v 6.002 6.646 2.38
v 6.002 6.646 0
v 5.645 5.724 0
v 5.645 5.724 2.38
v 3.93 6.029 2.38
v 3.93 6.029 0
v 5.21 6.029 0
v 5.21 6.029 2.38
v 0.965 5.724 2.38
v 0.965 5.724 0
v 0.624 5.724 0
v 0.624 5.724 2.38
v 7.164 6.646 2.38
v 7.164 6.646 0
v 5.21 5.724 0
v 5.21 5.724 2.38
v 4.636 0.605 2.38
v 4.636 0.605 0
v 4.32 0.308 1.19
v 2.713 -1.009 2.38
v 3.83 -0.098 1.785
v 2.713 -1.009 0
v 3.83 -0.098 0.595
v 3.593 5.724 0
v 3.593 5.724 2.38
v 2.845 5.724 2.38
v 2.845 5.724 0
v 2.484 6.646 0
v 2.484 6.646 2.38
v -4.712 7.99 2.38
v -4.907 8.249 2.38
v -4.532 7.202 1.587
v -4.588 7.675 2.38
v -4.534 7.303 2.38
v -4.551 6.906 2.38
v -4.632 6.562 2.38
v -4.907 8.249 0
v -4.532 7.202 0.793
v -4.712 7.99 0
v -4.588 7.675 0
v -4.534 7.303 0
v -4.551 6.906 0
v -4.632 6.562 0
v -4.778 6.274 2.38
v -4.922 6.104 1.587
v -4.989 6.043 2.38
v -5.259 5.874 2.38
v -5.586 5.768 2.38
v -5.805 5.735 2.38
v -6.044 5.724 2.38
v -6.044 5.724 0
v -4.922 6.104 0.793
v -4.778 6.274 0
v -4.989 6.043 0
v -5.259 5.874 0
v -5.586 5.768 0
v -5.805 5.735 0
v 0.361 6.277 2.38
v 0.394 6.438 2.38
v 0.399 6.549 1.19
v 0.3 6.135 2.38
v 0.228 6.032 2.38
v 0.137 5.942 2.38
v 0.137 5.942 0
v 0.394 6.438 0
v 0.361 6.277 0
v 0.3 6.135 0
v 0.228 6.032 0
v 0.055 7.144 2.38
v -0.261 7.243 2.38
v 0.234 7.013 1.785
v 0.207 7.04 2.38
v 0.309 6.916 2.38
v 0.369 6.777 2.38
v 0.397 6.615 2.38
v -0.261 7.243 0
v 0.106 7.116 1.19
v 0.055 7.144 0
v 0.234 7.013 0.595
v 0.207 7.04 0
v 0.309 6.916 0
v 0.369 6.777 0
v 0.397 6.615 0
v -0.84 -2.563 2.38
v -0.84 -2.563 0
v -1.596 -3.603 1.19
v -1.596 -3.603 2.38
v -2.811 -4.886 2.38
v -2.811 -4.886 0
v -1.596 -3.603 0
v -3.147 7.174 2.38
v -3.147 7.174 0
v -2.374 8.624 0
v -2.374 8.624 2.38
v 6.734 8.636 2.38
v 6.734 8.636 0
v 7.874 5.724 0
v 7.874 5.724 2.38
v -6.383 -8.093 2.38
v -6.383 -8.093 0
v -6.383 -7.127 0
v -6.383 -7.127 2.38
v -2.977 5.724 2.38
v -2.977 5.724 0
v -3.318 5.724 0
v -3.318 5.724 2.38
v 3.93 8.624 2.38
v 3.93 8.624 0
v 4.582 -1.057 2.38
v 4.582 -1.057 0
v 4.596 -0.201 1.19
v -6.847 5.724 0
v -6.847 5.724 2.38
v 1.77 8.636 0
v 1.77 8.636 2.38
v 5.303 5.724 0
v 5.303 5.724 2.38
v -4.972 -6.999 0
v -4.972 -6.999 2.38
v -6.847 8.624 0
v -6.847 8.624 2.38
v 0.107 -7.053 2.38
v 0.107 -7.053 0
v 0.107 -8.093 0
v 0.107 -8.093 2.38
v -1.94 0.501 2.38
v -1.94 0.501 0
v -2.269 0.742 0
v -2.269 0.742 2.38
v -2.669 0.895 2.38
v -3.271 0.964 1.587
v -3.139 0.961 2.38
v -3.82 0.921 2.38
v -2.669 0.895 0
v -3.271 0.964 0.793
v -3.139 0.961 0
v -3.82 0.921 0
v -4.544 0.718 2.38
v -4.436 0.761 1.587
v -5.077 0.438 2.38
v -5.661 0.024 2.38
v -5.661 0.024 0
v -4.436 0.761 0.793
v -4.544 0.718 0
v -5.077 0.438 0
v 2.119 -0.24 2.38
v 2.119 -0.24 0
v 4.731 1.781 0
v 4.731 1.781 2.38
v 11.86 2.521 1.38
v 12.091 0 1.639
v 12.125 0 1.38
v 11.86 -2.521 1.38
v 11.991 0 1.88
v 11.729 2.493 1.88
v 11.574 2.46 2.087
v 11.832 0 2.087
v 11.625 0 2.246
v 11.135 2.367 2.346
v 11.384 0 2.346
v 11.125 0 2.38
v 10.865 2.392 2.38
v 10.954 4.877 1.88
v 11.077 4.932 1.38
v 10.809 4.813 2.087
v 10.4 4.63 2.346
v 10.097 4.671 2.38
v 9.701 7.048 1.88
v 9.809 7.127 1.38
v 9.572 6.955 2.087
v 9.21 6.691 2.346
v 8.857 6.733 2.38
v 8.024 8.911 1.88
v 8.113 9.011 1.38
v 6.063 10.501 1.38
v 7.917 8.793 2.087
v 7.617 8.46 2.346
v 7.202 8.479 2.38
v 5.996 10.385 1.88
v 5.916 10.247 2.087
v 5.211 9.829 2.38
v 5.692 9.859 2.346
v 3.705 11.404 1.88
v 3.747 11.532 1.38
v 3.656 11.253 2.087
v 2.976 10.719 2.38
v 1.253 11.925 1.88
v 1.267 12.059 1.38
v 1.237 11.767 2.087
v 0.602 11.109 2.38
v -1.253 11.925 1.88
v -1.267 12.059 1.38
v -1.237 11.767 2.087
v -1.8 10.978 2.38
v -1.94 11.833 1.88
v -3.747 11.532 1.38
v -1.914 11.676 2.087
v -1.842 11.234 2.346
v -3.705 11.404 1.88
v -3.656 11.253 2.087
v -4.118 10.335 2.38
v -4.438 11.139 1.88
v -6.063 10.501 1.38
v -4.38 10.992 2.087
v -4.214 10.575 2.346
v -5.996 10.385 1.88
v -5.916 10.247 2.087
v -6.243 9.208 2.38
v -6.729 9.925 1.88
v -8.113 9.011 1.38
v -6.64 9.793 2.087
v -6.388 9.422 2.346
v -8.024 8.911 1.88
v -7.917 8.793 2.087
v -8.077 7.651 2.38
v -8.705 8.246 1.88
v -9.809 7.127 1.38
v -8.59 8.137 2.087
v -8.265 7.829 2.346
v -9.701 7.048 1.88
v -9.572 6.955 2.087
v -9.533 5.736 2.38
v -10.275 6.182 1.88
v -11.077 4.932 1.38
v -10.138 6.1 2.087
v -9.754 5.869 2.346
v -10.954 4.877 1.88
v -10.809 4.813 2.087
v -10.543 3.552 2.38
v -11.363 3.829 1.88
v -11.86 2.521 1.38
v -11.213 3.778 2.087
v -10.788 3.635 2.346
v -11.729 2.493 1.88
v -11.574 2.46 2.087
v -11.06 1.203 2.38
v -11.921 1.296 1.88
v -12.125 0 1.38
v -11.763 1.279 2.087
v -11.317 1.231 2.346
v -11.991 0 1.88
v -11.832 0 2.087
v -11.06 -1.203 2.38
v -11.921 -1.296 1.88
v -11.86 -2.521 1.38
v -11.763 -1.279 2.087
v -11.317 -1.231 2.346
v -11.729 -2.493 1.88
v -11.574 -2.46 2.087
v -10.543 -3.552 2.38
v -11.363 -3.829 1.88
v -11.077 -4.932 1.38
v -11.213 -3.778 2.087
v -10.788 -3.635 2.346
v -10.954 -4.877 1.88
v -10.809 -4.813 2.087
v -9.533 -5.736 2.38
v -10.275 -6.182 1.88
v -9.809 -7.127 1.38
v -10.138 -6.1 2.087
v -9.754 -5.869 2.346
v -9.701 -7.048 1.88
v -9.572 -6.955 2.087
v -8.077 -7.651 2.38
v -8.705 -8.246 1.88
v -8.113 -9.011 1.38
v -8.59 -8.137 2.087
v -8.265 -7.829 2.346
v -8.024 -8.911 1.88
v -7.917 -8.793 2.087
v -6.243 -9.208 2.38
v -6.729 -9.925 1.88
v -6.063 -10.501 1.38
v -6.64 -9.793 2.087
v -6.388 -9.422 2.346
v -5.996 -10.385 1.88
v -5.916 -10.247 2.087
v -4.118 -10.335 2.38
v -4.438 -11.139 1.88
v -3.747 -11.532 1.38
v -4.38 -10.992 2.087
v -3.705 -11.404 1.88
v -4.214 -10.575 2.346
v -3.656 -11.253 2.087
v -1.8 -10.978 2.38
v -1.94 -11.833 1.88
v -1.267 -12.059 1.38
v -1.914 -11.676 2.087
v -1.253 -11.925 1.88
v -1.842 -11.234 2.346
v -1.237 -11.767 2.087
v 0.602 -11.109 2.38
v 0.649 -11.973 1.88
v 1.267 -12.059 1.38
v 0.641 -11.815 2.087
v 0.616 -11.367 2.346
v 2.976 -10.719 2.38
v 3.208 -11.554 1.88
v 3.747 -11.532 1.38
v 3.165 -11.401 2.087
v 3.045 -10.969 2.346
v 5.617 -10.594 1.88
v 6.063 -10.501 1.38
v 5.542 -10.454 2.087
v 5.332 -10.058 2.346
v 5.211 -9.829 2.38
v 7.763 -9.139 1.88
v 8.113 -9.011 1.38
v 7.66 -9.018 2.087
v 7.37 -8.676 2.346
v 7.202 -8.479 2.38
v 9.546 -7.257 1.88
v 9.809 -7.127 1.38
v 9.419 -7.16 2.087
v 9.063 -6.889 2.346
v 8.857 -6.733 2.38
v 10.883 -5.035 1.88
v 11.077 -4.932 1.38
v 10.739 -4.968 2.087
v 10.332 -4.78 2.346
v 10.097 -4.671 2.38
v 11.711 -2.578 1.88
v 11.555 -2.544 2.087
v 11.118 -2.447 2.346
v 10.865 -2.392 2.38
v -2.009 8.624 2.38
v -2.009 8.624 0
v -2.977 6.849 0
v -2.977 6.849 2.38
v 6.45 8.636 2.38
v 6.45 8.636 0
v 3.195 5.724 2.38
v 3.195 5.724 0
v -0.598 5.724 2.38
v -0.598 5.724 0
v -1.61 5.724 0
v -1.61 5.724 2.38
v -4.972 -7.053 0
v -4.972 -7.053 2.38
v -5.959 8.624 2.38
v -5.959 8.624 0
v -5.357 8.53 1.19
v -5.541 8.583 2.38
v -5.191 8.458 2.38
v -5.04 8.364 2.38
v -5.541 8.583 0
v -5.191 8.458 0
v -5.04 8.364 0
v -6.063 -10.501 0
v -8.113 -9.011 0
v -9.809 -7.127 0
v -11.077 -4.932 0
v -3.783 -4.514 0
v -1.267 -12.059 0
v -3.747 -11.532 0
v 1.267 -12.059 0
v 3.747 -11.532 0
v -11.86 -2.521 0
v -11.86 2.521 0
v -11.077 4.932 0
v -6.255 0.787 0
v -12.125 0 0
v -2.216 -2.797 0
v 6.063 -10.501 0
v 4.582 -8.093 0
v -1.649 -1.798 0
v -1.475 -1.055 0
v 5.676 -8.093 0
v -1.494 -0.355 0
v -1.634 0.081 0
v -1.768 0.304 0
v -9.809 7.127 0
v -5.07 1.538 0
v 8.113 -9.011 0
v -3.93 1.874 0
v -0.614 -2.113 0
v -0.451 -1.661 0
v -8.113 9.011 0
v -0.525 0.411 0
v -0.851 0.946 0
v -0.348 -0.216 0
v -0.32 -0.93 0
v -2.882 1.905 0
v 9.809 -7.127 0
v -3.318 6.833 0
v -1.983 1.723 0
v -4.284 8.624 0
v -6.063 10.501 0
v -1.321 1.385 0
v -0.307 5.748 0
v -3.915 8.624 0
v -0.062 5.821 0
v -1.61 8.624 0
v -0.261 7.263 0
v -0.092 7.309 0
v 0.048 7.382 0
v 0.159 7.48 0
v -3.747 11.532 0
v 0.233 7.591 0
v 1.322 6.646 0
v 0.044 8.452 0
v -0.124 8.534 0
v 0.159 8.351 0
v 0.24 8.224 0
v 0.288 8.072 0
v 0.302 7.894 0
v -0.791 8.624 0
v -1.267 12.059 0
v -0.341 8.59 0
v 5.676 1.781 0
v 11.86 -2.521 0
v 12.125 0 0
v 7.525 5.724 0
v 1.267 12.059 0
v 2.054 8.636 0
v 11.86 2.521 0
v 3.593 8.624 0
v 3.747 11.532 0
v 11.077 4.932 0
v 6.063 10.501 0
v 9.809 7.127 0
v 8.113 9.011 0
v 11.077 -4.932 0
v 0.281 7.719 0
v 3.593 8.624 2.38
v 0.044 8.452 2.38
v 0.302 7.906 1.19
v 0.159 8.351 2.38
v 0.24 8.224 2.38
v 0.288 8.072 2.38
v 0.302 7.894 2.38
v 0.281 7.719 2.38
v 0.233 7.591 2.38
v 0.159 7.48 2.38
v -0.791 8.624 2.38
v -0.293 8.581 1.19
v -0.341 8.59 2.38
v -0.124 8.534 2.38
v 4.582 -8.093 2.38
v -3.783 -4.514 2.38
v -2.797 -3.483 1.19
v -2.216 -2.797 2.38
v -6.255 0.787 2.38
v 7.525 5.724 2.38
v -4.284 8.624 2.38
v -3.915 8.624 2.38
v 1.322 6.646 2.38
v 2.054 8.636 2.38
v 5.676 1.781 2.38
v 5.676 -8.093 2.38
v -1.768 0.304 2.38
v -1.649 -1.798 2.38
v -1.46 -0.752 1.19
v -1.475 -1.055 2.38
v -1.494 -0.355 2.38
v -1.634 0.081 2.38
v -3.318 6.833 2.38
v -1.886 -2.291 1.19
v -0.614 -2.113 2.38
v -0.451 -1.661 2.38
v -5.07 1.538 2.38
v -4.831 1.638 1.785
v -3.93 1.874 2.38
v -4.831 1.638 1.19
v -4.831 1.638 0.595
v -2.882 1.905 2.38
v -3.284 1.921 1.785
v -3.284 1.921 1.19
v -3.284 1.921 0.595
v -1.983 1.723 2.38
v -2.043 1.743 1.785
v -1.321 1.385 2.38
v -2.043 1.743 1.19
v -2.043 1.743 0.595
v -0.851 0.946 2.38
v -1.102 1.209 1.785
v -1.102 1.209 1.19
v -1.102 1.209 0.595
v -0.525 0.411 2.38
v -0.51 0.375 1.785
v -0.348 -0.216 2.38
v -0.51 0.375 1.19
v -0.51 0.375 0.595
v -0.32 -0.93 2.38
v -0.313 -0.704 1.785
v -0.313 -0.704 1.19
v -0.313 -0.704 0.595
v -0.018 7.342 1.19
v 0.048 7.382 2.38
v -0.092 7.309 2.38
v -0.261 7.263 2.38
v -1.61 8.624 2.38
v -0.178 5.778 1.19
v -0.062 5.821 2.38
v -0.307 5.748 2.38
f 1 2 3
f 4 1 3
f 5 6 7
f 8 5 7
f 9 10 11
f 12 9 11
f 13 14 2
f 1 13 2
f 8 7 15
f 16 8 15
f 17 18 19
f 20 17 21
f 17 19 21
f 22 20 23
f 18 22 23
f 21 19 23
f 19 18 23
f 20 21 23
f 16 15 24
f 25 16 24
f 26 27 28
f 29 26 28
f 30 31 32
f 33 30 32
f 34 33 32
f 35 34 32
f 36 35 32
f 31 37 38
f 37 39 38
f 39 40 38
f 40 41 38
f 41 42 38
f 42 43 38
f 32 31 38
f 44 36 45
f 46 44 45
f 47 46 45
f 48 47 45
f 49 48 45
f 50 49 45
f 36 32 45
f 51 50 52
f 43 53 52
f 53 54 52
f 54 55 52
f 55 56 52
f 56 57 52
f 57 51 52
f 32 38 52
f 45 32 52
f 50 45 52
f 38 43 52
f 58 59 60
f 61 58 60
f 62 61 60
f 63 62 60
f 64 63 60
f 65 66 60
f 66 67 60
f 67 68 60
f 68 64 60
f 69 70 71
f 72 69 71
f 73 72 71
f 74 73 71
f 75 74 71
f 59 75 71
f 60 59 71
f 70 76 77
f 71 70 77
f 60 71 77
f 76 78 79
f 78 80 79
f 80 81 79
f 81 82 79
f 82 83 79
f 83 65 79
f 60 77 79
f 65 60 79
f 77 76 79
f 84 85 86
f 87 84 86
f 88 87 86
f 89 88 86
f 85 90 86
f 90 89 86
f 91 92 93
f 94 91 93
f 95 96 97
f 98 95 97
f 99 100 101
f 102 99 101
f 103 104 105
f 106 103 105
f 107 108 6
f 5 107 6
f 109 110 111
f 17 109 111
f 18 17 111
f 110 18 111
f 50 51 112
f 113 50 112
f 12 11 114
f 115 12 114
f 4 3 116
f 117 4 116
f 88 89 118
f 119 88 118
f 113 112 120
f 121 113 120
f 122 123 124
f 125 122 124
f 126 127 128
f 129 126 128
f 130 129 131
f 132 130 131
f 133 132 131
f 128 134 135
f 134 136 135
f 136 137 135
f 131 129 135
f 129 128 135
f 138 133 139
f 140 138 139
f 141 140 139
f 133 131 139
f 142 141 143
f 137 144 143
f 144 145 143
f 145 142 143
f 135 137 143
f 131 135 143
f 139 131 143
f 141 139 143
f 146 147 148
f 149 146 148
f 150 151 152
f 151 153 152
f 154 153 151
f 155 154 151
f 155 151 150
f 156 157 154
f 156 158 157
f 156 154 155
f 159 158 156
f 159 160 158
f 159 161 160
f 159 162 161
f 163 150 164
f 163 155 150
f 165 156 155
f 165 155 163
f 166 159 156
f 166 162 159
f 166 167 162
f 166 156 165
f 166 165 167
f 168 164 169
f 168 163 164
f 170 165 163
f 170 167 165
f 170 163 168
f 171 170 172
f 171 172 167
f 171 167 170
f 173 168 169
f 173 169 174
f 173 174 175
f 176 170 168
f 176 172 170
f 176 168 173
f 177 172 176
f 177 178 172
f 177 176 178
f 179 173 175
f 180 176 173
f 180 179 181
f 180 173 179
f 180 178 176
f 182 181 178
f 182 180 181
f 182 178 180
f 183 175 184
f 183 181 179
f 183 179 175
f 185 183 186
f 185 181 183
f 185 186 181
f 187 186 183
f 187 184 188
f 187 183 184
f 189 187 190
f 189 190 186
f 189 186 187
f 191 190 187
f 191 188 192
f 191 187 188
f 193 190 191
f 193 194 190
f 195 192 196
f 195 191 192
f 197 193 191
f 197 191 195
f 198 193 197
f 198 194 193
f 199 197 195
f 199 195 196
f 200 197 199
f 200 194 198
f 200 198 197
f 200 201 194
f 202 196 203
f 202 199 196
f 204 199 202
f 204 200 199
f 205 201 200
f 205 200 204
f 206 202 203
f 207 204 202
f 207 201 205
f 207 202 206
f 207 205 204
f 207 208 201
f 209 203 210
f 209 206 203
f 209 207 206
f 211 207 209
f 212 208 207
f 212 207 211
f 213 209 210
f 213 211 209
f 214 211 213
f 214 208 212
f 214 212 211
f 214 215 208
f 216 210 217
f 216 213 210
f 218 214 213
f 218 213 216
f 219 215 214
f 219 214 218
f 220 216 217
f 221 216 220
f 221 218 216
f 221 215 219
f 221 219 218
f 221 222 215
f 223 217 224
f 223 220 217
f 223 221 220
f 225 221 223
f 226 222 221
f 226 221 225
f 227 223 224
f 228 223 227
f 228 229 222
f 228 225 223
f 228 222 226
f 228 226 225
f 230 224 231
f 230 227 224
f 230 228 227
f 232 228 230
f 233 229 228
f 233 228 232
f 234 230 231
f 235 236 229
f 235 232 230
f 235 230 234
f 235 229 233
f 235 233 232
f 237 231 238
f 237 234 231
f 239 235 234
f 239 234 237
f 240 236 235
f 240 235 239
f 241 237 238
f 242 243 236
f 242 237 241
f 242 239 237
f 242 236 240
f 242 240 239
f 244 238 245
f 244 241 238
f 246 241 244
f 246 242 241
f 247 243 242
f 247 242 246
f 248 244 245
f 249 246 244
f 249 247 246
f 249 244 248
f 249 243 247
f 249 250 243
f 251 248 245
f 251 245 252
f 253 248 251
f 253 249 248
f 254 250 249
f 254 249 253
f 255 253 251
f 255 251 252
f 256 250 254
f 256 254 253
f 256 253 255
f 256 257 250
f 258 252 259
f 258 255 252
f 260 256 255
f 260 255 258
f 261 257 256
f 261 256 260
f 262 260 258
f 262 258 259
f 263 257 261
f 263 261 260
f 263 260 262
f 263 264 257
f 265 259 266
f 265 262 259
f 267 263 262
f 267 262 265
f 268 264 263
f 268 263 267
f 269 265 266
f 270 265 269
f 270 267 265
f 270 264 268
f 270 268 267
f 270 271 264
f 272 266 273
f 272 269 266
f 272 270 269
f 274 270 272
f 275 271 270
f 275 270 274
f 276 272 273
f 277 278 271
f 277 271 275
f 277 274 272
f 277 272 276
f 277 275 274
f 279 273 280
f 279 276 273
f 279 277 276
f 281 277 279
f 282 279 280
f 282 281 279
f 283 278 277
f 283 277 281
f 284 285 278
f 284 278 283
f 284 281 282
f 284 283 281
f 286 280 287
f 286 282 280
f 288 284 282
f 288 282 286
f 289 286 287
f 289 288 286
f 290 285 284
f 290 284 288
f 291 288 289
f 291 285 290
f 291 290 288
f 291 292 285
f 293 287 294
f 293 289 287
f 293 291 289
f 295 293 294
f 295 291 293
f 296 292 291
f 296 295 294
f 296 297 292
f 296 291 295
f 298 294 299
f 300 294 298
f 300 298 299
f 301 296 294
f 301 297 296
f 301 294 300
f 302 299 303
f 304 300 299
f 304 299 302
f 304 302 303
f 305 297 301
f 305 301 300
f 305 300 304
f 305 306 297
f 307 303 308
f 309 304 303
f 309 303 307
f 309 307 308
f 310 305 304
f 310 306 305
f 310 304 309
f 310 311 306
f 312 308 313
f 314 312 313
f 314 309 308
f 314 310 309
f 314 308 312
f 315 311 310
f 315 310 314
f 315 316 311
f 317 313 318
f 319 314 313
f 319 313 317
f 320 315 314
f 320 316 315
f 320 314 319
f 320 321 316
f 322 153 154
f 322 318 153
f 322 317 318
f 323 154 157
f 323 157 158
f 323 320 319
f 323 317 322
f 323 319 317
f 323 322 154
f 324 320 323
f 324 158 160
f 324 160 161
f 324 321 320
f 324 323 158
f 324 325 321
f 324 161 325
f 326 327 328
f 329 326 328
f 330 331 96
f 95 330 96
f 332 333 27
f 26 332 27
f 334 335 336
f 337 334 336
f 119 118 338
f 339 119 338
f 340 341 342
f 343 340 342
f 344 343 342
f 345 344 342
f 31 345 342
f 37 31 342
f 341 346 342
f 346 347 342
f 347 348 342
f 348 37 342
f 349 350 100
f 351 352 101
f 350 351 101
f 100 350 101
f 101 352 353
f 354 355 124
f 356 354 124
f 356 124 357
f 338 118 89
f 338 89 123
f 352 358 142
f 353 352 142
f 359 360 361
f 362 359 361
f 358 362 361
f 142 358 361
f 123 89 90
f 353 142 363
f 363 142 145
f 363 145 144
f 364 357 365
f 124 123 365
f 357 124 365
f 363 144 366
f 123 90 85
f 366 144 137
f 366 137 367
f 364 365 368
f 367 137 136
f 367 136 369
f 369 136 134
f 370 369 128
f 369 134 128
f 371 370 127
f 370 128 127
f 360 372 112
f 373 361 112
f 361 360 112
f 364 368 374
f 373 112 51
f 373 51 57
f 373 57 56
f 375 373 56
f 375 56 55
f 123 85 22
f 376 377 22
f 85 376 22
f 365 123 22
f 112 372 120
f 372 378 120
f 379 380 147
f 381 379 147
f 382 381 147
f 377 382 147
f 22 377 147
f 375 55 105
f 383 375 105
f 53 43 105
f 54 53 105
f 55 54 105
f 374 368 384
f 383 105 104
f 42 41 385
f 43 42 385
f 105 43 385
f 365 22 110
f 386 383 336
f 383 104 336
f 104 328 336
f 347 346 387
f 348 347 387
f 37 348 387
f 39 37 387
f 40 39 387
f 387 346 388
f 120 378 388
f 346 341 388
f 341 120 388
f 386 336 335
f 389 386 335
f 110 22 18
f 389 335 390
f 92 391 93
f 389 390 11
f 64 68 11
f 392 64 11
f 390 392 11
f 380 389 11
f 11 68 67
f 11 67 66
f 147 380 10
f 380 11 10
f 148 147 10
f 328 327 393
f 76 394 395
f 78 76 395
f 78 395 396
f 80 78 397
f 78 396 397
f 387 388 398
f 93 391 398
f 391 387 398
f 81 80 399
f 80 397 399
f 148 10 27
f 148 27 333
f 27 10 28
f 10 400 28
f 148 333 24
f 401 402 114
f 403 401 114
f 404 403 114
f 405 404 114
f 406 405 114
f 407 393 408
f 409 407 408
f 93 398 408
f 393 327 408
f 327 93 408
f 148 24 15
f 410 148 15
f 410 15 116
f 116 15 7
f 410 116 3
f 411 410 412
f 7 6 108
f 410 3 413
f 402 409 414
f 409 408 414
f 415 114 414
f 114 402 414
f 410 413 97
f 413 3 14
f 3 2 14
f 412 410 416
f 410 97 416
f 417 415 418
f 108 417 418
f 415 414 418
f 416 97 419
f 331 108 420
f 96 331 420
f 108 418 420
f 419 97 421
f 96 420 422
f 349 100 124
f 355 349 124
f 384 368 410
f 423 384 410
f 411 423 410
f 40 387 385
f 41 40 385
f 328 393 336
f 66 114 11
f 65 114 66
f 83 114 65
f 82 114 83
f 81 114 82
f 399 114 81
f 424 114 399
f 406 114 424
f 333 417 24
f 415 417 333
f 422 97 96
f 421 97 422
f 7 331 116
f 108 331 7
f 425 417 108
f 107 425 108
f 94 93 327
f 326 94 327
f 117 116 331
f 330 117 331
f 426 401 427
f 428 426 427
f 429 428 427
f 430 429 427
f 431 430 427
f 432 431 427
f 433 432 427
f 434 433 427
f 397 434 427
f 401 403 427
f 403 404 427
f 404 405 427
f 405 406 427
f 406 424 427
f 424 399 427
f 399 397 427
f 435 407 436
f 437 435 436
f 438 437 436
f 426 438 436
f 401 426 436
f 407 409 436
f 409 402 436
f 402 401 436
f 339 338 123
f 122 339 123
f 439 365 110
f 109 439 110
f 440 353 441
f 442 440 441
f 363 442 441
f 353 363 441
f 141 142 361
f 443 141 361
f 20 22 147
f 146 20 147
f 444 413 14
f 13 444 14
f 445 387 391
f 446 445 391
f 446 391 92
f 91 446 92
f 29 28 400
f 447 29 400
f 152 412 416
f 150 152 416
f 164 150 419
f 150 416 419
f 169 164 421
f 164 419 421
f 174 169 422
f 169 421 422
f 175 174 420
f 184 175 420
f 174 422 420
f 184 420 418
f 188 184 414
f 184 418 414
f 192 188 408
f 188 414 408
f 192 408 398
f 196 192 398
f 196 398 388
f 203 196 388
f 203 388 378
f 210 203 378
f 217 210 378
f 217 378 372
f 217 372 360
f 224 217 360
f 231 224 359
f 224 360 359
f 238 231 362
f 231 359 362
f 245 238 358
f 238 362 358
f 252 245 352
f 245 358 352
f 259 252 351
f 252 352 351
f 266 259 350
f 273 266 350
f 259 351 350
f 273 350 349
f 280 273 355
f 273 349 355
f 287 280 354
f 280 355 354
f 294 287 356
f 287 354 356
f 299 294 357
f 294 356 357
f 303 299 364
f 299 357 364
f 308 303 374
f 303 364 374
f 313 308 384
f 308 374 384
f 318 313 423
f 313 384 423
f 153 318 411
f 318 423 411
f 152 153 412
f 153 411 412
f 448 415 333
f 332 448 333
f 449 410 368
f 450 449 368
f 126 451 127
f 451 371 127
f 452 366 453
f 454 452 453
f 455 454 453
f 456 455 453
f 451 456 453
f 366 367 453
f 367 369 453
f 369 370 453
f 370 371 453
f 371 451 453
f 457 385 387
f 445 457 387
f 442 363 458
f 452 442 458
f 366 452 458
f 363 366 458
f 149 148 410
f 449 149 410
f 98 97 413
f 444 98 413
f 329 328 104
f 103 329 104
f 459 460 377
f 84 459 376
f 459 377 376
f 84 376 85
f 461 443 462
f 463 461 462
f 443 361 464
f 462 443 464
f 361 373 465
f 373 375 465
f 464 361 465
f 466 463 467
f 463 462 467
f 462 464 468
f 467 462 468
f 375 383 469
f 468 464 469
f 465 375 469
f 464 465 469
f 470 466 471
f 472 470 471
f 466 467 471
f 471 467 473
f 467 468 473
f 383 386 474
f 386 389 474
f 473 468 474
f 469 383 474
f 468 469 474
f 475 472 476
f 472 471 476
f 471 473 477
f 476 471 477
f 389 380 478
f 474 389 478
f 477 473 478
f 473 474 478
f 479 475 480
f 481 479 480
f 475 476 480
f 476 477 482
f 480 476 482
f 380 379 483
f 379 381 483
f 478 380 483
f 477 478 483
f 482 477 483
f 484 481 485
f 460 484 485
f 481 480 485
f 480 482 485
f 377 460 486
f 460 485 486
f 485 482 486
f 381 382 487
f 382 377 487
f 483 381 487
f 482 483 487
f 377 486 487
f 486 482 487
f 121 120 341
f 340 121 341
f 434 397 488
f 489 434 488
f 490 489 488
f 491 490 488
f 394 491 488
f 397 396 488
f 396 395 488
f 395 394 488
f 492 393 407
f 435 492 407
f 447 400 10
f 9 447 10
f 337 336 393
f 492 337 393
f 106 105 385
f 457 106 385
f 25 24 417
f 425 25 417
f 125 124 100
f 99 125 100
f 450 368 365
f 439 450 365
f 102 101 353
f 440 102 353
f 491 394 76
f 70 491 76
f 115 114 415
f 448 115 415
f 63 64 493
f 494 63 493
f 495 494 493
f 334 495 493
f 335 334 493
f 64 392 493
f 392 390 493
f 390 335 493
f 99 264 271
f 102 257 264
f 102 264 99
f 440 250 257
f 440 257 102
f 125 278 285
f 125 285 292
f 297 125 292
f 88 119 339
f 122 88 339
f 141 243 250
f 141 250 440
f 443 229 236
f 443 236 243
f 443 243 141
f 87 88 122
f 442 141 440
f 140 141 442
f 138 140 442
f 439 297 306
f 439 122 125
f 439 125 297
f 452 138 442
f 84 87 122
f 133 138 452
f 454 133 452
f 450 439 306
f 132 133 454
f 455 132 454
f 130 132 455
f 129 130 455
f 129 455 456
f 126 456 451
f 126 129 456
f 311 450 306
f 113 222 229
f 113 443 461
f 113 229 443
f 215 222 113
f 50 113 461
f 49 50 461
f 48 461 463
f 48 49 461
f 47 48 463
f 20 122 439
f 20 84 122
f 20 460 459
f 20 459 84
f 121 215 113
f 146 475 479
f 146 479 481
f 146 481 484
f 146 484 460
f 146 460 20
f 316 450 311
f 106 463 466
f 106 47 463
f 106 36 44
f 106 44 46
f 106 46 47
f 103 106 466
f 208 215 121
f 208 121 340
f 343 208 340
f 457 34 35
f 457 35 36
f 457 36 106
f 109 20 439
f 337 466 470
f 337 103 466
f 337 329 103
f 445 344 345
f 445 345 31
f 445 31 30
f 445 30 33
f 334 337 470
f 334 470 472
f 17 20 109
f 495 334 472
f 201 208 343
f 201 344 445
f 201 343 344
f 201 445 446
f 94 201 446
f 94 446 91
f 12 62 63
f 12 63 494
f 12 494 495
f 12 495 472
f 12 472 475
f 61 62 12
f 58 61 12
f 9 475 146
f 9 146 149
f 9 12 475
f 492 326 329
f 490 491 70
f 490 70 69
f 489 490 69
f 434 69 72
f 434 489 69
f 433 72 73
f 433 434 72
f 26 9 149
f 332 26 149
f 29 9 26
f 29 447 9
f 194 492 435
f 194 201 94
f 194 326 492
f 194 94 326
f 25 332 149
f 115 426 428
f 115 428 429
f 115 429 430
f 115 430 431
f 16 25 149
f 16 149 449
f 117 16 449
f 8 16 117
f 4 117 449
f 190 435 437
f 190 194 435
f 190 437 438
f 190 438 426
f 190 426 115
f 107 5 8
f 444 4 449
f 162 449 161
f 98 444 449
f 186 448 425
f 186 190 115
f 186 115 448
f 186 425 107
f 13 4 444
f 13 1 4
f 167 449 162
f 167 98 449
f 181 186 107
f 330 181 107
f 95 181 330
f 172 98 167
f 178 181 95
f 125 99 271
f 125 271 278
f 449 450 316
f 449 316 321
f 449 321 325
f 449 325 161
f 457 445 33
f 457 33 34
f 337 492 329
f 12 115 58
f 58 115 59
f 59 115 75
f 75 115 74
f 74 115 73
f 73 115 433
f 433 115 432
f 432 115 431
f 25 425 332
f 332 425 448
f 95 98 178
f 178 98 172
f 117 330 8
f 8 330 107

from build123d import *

# Parameters (mm, degrees)
F0_R     = 12.125
F1_DEPTH = 2.38
F2_R     = 1


with BuildPart() as f1:
    # F0 (on Top) → F1 (new body)
    with BuildSketch(Plane.XY):
        Circle(F0_R)
        with BuildLine():
            Line((0.1066171413, -7.0534729545), (0.1066171413, -8.0929240212))
            Line((0.1066171413, -8.0929240212), (-6.3829287074, -8.0929240212))
            Line((-6.3829287074, -8.0929240212), (-6.3829287074, -7.1269476661))
            Line((-6.3829287074, -7.1269476661), (-3.7832205302, -4.5142733634))
            add(Edge.make_bspline(
                [(-3.7832205302, -4.5142733634), (-2.5946590195, -3.3105847061), (-2.216480357, -2.7973422356)],
                knots=[0, 0, 0, 1, 1, 1], degree=2))
            add(Edge.make_bspline(
                [(-2.216480357, -2.7973422356), (-1.8383016945, -2.284099765), (-1.6492123632, -1.7978700561)],
                knots=[0, 0, 0, 1, 1, 1], degree=2))
            add(Edge.make_bspline(
                [(-1.6492123632, -1.7978700561), (-1.460123032, -1.3116403472), (-1.460123032, -0.7519359267)],
                knots=[0, 0, 0, 1, 1, 1], degree=2))
            add(Edge.make_bspline(
                [(-1.460123032, -0.7519359267), (-1.460123032, 0.0389977332), (-1.9398696781, 0.501456212)],
                knots=[0, 0, 0, 1, 1, 1], degree=2))
            add(Edge.make_bspline(
                [(-1.9398696781, 0.501456212), (-2.4196163243, 0.9639146907), (-3.2710585702, 0.9639146907)],
                knots=[0, 0, 0, 1, 1, 1], degree=2))
            add(Edge.make_bspline(
                [(-3.2710585702, 0.9639146907), (-3.8847885139, 0.9639146907), (-4.4358488507, 0.7607787234)],
                knots=[0, 0, 0, 1, 1, 1], degree=2))
            add(Edge.make_bspline(
                [(-4.4358488507, 0.7607787234), (-4.9869091875, 0.5576427561), (-5.6611477172, 0.0238705867)],
                knots=[0, 0, 0, 1, 1, 1], degree=2))
            Line((-5.6611477172, 0.0238705867), (-6.2554284726, 0.7867109745))
            add(Edge.make_bspline(
                [(-6.2554284726, 0.7867109745), (-4.8918242666, 1.9212469621), (-3.2840246957, 1.9212469621)],
                knots=[0, 0, 0, 1, 1, 1], degree=2))
            add(Edge.make_bspline(
                [(-3.2840246957, 1.9212469621), (-1.8923272177, 1.9212469621), (-1.1024740683, 1.2091905661)],
                knots=[0, 0, 0, 1, 1, 1], degree=2))
            add(Edge.make_bspline(
                [(-1.1024740683, 1.2091905661), (-0.3126209189, 0.4971341701), (-0.3126209189, -0.7043934662)],
                knots=[0, 0, 0, 1, 1, 1], degree=2))
            add(Edge.make_bspline(
                [(-0.3126209189, -0.7043934662), (-0.3126209189, -1.6444375702), (-0.8399100255, -2.5628714648)],
                knots=[0, 0, 0, 1, 1, 1], degree=2))
            add(Edge.make_bspline(
                [(-0.8399100255, -2.5628714648), (-1.367199132, -3.4813053595), (-2.8107611124, -4.8859689631)],
                knots=[0, 0, 0, 1, 1, 1], degree=2))
            Line((-2.8107611124, -4.8859689631), (-4.971782041, -6.9994474313))
            Line((-4.971782041, -6.9994474313), (-4.971782041, -7.0534729545))
            Line((-4.971782041, -7.0534729545), (0.1066171413, -7.0534729545))
        make_face(mode=Mode.SUBTRACT)
        with BuildLine():
            Line((5.6755680743, 1.7807806017), (5.6755680743, -8.0929240212))
            Line((5.6755680743, -8.0929240212), (4.5820914845, -8.0929240212))
            Line((4.5820914845, -8.0929240212), (4.5820914845, -1.0566398776))
            add(Edge.make_bspline(
                [(4.5820914845, -1.0566398776), (4.5820914845, -0.1771043596), (4.6361170077, 0.6051852165)],
                knots=[0, 0, 0, 1, 1, 1], degree=2))
            add(Edge.make_bspline(
                [(4.6361170077, 0.6051852165), (4.4956506473, 0.4625578352), (4.3195274416, 0.3080448388)],
                knots=[0, 0, 0, 1, 1, 1], degree=2))
            add(Edge.make_bspline(
                [(4.3195274416, 0.3080448388), (4.1434042359, 0.1535318424), (2.7128083812, -1.0090974172)],
                knots=[0, 0, 0, 1, 1, 1], degree=2))
            Line((2.7128083812, -1.0090974172), (2.1185276258, -0.2397739666))
            Line((2.1185276258, -0.2397739666), (4.7312019285, 1.7807806017))
            Line((4.7312019285, 1.7807806017), (5.6755680743, 1.7807806017))
        make_face(mode=Mode.SUBTRACT)
        with BuildLine():
            add(Edge.make_bspline(
                [(-4.9071200765, 8.249331423), (-4.5322706665, 7.874482013), (-4.5322706665, 7.201593995)],
                knots=[0, 0, 0, 1, 1, 1], degree=2))
            add(Edge.make_bspline(
                [(-4.5322706665, 7.201593995), (-4.5322706665, 6.4836351758), (-4.9220378769, 6.1037073656)],
                knots=[0, 0, 0, 1, 1, 1], degree=2))
            add(Edge.make_bspline(
                [(-4.9220378769, 6.1037073656), (-5.3118050873, 5.7237795554), (-6.0437295069, 5.7237795554)],
                knots=[0, 0, 0, 1, 1, 1], degree=2))
            Line((-6.0437295069, 5.7237795554), (-6.8473863284, 5.7237795554))
            Line((-6.8473863284, 5.7237795554), (-6.8473863284, 8.6241808331))
            Line((-6.8473863284, 8.6241808331), (-5.9586663047, 8.6241808331))
            add(Edge.make_bspline(
                [(-5.9586663047, 8.6241808331), (-5.2819694865, 8.6241808331), (-4.9071200765, 8.249331423)],
                knots=[0, 0, 0, 1, 1, 1], degree=2))
        make_face(mode=Mode.SUBTRACT)
        Polygon((-3.9152450499, 8.6241808331), (-3.1471370294, 7.1736627942), (-2.3739506087, 8.6241808331), (-2.0089405989, 8.6241808331), (-2.9770106248, 6.8486451855), (-2.9770106248, 5.7237795554), (-3.3178982339, 5.7237795554), (-3.3178982339, 6.8327751851), (-4.2840638598, 8.6241808331), align=None, mode=Mode.SUBTRACT)
        with BuildLine():
            Line((-1.6102861882, 5.7237795554), (-1.6102861882, 8.6241808331))
            Line((-1.6102861882, 8.6241808331), (-0.7907593663, 8.6241808331))
            add(Edge.make_bspline(
                [(-0.7907593663, 8.6241808331), (-0.2137261508, 8.6241808331), (0.0443200561, 8.4515152284)],
                knots=[0, 0, 0, 1, 1, 1], degree=2))
            add(Edge.make_bspline(
                [(0.0443200561, 8.4515152284), (0.302366263, 8.2788496238), (0.302366263, 7.9062220138)],
                knots=[0, 0, 0, 1, 1, 1], degree=2))
            add(Edge.make_bspline(
                [(0.302366263, 7.9062220138), (0.302366263, 7.6478584069), (0.1585840591, 7.4802712024)],
                knots=[0, 0, 0, 1, 1, 1], degree=2))
            add(Edge.make_bspline(
                [(0.1585840591, 7.4802712024), (0.0148018553, 7.312683998), (-0.2613361521, 7.2631695966)],
                knots=[0, 0, 0, 1, 1, 1], degree=2))
            Line((-0.2613361521, 7.2631695966), (-0.2613361521, 7.2434907961))
            add(Edge.make_bspline(
                [(-0.2613361521, 7.2434907961), (0.3994906656, 7.1304963931), (0.3994906656, 6.5490195775)],
                knots=[0, 0, 0, 1, 1, 1], degree=2))
            add(Edge.make_bspline(
                [(0.3994906656, 6.5490195775), (0.3994906656, 6.1605219671), (0.1366834585, 5.9421507613)],
                knots=[0, 0, 0, 1, 1, 1], degree=2))
            add(Edge.make_bspline(
                [(0.1366834585, 5.9421507613), (-0.1261237485, 5.7237795554), (-0.5984149611, 5.7237795554)],
                knots=[0, 0, 0, 1, 1, 1], degree=2))
            Line((-0.5984149611, 5.7237795554), (-1.6102861882, 5.7237795554))
        make_face(mode=Mode.SUBTRACT)
        Polygon((3.1945151404, 5.7237795554), (2.8453751311, 5.7237795554), (2.4841739214, 6.6461439801), (1.3218550903, 6.6461439801), (0.9650974807, 5.7237795554), (0.6235750716, 5.7237795554), (1.7700239023, 8.6362420334), (2.0537795099, 8.6362420334), align=None, mode=Mode.SUBTRACT)
        Polygon((5.2100051944, 5.7237795554), (3.5931695511, 5.7237795554), (3.5931695511, 8.6241808331), (3.9302483601, 8.6241808331), (3.9302483601, 6.0291183636), (5.2100051944, 6.0291183636), align=None, mode=Mode.SUBTRACT)
        Polygon((7.8742608657, 5.7237795554), (7.5251208564, 5.7237795554), (7.1639196467, 6.6461439801), (6.0016008156, 6.6461439801), (5.644843206, 5.7237795554), (5.3033207969, 5.7237795554), (6.4497696276, 8.6362420334), (6.7335252352, 8.6362420334), align=None, mode=Mode.SUBTRACT)
    extrude(amount=F1_DEPTH)

    # F2
    f2_edges = [f1.edges().sort_by_distance(p)[0] for p in [
        (-12.125, 0, 2.38),
    ]]
    fillet(f2_edges, radius=F2_R)


solid = f1.part
